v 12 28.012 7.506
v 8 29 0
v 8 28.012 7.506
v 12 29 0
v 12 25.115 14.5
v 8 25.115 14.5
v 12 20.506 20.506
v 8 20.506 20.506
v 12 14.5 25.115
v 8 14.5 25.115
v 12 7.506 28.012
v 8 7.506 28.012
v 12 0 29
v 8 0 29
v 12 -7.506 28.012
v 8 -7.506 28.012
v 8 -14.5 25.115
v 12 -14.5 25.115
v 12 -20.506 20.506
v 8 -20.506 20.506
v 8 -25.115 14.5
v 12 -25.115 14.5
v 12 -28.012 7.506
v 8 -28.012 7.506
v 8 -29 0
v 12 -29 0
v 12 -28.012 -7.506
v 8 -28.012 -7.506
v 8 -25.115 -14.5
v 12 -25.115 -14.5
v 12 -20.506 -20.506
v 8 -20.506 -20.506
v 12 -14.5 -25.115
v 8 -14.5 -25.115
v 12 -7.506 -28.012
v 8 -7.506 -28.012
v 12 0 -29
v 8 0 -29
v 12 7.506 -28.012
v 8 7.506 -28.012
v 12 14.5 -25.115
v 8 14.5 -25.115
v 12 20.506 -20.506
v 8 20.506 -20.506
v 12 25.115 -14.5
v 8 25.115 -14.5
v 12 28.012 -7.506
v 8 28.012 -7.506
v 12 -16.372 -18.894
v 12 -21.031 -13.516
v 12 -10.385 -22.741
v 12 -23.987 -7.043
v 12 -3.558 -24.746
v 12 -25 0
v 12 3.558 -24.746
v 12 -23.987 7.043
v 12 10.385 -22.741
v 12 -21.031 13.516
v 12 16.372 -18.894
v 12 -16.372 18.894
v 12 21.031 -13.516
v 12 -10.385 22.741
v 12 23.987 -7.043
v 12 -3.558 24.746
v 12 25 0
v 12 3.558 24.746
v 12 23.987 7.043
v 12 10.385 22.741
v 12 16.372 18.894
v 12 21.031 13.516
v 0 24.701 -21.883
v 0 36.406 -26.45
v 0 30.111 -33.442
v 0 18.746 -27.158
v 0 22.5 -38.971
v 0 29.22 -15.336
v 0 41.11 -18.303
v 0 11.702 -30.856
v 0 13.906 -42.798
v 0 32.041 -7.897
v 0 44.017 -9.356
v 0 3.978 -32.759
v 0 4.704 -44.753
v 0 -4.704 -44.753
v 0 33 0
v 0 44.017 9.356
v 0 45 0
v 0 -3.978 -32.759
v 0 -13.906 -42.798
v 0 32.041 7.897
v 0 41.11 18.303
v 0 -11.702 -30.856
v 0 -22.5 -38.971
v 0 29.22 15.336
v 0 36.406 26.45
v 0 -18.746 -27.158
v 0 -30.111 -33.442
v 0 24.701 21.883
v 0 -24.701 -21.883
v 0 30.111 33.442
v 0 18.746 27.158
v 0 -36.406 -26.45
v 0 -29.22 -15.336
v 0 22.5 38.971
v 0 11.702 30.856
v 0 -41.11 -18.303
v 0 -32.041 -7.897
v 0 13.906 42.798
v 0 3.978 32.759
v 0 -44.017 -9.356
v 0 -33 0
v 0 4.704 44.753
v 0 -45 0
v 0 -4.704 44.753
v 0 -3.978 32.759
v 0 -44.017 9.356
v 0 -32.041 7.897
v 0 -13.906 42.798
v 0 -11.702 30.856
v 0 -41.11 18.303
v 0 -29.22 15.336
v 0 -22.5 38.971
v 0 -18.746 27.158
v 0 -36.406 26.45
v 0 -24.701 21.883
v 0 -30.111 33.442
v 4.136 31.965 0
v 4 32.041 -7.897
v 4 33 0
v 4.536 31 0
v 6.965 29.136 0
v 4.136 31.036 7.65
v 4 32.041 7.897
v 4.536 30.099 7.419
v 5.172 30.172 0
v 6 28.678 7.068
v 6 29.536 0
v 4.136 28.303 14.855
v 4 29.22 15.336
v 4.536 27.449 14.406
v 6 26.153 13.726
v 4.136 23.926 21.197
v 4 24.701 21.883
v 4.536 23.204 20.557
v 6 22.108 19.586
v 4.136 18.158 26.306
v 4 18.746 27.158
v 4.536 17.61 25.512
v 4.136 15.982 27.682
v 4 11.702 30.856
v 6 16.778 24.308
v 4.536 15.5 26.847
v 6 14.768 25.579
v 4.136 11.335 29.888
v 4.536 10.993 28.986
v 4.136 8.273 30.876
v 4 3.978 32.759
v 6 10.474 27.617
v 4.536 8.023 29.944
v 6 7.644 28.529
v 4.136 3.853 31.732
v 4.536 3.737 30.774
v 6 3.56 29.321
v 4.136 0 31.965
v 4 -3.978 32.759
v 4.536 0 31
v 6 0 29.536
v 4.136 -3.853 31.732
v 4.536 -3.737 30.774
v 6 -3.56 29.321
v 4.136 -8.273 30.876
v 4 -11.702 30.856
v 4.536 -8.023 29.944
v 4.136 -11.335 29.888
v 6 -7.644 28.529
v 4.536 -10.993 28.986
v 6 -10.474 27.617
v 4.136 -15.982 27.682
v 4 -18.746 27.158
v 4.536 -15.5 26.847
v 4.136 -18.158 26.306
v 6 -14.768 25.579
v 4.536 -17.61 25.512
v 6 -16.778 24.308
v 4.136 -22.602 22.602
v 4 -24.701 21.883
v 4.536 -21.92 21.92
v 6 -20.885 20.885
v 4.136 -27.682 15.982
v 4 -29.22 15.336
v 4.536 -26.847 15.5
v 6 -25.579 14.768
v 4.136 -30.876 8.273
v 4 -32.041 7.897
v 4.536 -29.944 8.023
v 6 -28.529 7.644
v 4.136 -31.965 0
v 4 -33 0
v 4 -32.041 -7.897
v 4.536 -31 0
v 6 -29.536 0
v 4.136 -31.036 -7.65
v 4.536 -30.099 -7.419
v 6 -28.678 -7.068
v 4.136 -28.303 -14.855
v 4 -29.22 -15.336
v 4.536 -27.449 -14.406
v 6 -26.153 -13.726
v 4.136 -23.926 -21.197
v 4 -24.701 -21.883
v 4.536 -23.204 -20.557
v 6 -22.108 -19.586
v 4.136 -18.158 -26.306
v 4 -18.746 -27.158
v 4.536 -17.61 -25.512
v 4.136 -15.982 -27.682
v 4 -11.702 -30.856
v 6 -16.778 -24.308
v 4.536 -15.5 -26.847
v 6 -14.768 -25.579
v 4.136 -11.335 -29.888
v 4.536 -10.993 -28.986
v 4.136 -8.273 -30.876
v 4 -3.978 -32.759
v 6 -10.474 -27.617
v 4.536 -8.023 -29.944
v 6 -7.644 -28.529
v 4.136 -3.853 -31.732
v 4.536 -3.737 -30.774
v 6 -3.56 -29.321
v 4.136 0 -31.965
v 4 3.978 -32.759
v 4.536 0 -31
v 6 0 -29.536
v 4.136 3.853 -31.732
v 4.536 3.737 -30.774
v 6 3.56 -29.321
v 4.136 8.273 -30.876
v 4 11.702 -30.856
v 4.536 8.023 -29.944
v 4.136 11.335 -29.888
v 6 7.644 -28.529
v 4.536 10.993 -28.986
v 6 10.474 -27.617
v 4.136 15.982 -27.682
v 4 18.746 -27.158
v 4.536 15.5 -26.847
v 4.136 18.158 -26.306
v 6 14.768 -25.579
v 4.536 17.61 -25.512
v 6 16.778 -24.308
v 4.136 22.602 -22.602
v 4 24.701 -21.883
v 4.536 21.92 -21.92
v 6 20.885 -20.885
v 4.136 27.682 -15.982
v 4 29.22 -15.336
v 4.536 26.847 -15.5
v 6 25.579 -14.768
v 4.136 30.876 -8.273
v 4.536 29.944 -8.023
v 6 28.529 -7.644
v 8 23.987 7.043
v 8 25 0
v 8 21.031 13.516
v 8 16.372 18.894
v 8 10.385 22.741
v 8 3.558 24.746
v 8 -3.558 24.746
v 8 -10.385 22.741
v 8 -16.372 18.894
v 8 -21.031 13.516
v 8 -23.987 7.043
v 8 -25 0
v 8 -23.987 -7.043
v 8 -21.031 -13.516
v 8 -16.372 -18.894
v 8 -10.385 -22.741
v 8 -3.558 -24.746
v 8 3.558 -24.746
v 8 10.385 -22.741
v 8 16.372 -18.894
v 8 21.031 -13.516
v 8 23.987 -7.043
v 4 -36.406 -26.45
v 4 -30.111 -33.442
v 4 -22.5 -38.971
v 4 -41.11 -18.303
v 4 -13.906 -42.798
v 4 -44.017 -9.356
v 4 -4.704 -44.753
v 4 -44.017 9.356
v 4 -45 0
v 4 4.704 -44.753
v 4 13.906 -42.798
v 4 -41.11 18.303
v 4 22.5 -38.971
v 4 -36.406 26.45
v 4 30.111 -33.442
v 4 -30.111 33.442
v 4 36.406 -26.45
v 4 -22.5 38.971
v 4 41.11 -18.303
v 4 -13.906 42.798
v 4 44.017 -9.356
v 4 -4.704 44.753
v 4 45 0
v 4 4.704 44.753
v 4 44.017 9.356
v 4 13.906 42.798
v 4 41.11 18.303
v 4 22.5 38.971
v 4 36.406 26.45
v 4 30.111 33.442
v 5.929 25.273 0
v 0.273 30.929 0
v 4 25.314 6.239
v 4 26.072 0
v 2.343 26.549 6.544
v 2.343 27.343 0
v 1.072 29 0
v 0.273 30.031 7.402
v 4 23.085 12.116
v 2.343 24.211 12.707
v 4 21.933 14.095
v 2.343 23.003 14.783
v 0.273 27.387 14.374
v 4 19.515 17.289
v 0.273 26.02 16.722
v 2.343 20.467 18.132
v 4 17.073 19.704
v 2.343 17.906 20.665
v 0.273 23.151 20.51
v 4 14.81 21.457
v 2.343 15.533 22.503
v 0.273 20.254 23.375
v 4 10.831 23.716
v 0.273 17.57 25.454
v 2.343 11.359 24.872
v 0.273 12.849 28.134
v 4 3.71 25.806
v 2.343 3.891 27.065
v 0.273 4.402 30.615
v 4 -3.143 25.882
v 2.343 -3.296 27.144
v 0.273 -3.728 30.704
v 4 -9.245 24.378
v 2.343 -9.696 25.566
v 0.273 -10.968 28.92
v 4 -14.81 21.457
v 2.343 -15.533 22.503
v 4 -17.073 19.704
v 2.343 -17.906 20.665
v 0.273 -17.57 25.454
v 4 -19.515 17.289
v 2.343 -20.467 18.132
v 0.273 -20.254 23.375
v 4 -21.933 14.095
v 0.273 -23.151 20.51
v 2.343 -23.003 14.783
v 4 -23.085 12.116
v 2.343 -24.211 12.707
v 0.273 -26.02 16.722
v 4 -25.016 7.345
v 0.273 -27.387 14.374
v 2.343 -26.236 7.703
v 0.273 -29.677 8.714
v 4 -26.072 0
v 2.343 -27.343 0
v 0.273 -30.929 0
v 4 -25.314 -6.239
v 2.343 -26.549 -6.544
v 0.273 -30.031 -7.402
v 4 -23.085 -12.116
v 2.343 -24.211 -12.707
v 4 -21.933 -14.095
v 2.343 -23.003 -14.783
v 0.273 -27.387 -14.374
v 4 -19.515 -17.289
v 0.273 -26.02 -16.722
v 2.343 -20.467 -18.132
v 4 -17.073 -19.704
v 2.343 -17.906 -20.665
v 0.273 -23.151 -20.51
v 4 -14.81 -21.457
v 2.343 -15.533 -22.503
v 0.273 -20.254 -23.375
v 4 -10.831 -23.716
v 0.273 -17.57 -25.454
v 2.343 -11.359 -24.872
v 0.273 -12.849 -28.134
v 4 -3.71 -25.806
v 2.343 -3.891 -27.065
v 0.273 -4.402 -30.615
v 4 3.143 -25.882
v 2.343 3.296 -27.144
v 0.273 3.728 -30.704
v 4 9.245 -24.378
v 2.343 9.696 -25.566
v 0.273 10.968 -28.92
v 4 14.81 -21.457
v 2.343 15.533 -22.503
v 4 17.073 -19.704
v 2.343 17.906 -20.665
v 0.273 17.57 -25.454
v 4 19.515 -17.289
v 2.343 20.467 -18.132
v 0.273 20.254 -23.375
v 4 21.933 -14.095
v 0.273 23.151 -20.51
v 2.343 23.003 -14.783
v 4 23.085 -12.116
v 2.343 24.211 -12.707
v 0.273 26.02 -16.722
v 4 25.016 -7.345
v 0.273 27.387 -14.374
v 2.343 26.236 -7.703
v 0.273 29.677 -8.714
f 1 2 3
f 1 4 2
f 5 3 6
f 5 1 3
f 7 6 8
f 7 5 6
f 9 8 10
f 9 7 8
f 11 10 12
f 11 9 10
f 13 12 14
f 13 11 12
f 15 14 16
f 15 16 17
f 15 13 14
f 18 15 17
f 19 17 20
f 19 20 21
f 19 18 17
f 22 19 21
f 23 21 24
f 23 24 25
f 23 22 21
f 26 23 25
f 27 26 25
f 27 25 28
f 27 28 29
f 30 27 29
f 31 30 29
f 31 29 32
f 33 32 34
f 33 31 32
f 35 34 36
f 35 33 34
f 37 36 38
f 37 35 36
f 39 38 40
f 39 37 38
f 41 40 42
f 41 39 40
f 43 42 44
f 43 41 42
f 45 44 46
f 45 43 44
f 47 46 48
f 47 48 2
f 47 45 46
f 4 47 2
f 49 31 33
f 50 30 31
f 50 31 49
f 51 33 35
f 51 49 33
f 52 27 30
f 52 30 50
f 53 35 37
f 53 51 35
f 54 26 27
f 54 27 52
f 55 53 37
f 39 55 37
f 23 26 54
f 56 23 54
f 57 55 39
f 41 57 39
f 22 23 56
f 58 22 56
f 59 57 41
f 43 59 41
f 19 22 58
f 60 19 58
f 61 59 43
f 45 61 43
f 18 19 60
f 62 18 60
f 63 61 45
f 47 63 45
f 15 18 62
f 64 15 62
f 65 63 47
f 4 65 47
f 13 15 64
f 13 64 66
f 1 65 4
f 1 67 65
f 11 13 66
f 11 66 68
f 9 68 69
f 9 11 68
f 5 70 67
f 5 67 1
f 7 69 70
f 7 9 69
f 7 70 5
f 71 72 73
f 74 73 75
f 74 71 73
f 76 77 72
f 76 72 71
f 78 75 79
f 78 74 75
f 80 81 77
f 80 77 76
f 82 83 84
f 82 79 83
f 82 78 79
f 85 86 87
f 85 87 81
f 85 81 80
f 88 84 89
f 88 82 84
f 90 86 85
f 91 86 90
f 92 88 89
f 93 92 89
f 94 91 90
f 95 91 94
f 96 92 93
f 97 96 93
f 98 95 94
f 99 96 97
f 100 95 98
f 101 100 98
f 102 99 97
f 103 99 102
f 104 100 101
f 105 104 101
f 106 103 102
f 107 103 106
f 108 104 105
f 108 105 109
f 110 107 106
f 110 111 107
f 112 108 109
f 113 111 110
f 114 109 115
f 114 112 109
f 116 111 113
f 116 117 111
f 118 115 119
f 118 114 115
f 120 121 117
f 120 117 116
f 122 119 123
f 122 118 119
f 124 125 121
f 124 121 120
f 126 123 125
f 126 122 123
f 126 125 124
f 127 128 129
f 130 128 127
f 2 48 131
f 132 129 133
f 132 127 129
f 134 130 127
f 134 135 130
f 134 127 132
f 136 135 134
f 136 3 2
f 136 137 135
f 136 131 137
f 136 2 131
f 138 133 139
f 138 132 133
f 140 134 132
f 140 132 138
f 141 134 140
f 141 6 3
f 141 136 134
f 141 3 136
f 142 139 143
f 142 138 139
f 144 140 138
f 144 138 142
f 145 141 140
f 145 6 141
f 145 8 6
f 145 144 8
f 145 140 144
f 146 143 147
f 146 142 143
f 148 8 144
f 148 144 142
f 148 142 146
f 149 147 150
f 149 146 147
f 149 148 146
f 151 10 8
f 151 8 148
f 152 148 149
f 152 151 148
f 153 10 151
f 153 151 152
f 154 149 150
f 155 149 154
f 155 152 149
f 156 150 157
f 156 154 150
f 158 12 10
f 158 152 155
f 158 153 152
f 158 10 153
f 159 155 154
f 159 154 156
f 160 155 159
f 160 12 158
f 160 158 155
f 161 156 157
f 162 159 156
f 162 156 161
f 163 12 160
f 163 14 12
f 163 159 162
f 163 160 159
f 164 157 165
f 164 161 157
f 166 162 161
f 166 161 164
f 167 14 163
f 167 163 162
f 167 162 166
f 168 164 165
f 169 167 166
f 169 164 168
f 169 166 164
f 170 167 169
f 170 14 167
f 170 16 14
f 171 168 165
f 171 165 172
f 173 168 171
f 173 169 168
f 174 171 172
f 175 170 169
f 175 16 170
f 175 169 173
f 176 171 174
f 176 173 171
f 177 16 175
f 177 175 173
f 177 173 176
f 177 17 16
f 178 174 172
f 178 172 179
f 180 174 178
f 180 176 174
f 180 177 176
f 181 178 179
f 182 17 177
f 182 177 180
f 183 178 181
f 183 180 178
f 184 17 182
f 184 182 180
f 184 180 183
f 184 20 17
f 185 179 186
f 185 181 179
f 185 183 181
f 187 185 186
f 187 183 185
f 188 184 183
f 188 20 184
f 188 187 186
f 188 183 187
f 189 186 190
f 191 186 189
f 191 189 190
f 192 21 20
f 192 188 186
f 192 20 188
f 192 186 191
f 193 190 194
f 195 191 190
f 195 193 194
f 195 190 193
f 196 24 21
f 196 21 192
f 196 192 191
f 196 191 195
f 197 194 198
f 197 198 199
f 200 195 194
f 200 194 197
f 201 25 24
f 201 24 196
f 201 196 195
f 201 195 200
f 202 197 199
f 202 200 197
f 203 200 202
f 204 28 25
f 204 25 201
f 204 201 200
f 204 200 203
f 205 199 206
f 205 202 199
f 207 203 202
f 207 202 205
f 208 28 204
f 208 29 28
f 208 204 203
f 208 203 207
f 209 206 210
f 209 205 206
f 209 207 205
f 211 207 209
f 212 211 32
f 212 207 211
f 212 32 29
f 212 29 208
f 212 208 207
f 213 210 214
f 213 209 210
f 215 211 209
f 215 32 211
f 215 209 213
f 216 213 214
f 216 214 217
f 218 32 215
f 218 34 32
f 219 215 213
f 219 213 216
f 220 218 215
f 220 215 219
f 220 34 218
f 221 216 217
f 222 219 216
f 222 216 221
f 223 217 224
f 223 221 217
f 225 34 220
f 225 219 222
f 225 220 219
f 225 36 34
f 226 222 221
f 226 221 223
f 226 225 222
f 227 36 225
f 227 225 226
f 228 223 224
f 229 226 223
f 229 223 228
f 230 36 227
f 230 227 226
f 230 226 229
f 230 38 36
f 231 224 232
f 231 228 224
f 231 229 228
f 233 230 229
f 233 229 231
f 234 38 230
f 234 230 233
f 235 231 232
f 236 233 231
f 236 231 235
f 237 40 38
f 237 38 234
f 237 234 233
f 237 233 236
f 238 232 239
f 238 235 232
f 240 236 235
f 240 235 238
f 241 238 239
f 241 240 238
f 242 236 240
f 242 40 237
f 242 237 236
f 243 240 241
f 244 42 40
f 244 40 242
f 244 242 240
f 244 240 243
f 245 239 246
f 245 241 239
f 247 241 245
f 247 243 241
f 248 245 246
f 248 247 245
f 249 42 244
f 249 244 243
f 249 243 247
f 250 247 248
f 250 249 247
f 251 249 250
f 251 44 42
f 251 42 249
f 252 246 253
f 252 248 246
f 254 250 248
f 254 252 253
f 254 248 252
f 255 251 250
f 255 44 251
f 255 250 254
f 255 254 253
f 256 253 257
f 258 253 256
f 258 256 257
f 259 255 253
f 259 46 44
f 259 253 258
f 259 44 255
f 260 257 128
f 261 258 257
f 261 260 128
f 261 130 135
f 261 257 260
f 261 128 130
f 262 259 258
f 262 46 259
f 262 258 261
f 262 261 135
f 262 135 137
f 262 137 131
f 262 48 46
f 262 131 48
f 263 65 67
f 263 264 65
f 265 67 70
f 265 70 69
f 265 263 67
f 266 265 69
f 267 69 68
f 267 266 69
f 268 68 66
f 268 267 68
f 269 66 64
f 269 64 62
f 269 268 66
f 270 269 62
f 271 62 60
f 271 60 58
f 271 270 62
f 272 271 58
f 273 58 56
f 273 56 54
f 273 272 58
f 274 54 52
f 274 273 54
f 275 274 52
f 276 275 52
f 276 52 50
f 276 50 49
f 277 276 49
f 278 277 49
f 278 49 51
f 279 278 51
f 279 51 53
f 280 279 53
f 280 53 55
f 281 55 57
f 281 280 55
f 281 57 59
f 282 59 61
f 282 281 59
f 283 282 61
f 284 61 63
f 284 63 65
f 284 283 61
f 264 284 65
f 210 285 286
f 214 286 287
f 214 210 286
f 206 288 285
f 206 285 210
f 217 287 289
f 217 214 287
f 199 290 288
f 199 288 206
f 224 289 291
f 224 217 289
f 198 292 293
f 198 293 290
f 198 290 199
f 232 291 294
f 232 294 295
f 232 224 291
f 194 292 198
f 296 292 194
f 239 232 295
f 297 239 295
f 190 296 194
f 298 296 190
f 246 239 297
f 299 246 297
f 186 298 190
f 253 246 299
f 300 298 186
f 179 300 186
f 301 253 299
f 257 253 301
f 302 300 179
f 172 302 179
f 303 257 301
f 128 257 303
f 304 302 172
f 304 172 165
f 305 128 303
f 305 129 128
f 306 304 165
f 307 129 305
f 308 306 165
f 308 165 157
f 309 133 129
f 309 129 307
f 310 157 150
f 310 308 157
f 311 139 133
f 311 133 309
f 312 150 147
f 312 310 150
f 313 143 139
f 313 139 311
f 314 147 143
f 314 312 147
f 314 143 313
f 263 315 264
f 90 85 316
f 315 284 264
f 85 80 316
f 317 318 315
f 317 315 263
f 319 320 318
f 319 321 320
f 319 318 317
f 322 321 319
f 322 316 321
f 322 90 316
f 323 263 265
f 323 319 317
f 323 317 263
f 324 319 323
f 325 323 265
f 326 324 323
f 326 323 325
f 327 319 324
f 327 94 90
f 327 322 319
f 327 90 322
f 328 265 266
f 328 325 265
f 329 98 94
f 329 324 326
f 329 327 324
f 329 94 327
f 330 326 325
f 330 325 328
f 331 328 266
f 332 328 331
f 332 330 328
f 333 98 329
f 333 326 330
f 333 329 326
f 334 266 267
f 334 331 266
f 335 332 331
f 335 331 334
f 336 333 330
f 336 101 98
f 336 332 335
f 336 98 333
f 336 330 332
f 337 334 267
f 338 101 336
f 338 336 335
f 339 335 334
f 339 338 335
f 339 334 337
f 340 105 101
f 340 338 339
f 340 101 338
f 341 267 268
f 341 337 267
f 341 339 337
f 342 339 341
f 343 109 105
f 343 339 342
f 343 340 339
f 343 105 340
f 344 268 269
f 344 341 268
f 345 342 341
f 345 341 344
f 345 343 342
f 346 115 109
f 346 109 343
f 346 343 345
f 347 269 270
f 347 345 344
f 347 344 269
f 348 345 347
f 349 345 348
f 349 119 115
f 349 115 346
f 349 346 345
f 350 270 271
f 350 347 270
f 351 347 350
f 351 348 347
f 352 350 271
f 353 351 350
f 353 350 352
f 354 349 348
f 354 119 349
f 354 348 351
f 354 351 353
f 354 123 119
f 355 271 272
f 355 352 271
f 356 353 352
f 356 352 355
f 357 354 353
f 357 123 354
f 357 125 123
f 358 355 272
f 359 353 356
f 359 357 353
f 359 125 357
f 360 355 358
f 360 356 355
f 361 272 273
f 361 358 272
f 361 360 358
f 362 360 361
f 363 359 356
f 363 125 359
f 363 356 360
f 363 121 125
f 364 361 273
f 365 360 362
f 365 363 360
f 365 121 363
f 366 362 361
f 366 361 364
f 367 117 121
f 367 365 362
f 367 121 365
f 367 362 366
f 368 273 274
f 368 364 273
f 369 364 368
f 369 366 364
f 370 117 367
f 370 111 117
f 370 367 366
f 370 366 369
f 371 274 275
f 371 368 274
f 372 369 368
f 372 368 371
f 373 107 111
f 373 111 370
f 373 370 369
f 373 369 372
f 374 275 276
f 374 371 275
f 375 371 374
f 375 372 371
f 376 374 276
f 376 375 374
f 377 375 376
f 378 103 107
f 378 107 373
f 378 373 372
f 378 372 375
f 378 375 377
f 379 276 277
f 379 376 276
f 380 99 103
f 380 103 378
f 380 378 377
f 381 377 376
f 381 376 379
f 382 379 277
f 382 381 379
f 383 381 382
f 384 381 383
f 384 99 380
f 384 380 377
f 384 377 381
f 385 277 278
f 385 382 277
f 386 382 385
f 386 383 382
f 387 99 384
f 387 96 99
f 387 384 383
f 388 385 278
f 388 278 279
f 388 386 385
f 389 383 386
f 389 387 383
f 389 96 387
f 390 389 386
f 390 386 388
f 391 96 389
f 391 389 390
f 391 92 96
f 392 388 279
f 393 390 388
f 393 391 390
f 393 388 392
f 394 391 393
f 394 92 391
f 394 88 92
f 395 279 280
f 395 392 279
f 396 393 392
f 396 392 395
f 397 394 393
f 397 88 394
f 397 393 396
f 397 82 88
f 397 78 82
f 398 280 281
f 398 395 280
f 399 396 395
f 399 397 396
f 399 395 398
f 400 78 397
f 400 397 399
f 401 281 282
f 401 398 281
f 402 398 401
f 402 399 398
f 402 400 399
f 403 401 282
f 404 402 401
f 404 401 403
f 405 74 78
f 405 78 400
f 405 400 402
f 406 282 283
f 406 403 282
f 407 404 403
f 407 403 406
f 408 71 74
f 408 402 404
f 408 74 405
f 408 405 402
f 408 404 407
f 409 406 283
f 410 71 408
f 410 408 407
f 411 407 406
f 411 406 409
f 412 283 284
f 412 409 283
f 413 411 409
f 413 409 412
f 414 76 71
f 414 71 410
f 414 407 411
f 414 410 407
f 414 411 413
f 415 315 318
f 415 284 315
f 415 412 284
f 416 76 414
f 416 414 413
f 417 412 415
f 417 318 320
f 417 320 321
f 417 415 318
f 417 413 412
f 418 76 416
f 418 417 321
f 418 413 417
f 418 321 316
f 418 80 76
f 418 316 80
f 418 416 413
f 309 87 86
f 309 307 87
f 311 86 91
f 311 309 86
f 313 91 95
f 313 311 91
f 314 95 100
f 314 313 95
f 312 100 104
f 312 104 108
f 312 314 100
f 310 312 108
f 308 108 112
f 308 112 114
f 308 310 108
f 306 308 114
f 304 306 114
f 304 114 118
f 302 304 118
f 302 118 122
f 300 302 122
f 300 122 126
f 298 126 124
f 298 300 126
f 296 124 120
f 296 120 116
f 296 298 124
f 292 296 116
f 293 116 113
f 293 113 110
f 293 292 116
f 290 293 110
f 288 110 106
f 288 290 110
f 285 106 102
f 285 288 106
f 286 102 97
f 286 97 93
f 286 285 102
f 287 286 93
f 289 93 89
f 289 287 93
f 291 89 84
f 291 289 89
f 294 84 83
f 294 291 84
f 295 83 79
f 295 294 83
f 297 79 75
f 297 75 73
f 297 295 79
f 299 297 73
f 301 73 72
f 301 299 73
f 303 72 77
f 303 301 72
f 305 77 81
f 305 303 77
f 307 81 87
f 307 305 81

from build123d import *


with BuildPart() as part:
    # Sketch1 → Revolve1 (revolve)
    with BuildSketch(Plane.XY):
        with BuildLine():
            Line((0, 45), (4, 45))
            Line((4, 45), (4, 33))
            ThreePointArc((4, 33), (5.171572875, 30.171572875), (8, 29))
            Line((8, 29), (12, 29))
            Line((12, 29), (12, 25))
            Line((12, 25), (8, 25))
            ThreePointArc((8, 25), (2.343145751, 27.343145751), (0, 33))
            Line((0, 33), (0, 45))
        make_face()
    revolve(axis=Axis((0, 0, 0), (1, 0, 0)))


solid = part.part
